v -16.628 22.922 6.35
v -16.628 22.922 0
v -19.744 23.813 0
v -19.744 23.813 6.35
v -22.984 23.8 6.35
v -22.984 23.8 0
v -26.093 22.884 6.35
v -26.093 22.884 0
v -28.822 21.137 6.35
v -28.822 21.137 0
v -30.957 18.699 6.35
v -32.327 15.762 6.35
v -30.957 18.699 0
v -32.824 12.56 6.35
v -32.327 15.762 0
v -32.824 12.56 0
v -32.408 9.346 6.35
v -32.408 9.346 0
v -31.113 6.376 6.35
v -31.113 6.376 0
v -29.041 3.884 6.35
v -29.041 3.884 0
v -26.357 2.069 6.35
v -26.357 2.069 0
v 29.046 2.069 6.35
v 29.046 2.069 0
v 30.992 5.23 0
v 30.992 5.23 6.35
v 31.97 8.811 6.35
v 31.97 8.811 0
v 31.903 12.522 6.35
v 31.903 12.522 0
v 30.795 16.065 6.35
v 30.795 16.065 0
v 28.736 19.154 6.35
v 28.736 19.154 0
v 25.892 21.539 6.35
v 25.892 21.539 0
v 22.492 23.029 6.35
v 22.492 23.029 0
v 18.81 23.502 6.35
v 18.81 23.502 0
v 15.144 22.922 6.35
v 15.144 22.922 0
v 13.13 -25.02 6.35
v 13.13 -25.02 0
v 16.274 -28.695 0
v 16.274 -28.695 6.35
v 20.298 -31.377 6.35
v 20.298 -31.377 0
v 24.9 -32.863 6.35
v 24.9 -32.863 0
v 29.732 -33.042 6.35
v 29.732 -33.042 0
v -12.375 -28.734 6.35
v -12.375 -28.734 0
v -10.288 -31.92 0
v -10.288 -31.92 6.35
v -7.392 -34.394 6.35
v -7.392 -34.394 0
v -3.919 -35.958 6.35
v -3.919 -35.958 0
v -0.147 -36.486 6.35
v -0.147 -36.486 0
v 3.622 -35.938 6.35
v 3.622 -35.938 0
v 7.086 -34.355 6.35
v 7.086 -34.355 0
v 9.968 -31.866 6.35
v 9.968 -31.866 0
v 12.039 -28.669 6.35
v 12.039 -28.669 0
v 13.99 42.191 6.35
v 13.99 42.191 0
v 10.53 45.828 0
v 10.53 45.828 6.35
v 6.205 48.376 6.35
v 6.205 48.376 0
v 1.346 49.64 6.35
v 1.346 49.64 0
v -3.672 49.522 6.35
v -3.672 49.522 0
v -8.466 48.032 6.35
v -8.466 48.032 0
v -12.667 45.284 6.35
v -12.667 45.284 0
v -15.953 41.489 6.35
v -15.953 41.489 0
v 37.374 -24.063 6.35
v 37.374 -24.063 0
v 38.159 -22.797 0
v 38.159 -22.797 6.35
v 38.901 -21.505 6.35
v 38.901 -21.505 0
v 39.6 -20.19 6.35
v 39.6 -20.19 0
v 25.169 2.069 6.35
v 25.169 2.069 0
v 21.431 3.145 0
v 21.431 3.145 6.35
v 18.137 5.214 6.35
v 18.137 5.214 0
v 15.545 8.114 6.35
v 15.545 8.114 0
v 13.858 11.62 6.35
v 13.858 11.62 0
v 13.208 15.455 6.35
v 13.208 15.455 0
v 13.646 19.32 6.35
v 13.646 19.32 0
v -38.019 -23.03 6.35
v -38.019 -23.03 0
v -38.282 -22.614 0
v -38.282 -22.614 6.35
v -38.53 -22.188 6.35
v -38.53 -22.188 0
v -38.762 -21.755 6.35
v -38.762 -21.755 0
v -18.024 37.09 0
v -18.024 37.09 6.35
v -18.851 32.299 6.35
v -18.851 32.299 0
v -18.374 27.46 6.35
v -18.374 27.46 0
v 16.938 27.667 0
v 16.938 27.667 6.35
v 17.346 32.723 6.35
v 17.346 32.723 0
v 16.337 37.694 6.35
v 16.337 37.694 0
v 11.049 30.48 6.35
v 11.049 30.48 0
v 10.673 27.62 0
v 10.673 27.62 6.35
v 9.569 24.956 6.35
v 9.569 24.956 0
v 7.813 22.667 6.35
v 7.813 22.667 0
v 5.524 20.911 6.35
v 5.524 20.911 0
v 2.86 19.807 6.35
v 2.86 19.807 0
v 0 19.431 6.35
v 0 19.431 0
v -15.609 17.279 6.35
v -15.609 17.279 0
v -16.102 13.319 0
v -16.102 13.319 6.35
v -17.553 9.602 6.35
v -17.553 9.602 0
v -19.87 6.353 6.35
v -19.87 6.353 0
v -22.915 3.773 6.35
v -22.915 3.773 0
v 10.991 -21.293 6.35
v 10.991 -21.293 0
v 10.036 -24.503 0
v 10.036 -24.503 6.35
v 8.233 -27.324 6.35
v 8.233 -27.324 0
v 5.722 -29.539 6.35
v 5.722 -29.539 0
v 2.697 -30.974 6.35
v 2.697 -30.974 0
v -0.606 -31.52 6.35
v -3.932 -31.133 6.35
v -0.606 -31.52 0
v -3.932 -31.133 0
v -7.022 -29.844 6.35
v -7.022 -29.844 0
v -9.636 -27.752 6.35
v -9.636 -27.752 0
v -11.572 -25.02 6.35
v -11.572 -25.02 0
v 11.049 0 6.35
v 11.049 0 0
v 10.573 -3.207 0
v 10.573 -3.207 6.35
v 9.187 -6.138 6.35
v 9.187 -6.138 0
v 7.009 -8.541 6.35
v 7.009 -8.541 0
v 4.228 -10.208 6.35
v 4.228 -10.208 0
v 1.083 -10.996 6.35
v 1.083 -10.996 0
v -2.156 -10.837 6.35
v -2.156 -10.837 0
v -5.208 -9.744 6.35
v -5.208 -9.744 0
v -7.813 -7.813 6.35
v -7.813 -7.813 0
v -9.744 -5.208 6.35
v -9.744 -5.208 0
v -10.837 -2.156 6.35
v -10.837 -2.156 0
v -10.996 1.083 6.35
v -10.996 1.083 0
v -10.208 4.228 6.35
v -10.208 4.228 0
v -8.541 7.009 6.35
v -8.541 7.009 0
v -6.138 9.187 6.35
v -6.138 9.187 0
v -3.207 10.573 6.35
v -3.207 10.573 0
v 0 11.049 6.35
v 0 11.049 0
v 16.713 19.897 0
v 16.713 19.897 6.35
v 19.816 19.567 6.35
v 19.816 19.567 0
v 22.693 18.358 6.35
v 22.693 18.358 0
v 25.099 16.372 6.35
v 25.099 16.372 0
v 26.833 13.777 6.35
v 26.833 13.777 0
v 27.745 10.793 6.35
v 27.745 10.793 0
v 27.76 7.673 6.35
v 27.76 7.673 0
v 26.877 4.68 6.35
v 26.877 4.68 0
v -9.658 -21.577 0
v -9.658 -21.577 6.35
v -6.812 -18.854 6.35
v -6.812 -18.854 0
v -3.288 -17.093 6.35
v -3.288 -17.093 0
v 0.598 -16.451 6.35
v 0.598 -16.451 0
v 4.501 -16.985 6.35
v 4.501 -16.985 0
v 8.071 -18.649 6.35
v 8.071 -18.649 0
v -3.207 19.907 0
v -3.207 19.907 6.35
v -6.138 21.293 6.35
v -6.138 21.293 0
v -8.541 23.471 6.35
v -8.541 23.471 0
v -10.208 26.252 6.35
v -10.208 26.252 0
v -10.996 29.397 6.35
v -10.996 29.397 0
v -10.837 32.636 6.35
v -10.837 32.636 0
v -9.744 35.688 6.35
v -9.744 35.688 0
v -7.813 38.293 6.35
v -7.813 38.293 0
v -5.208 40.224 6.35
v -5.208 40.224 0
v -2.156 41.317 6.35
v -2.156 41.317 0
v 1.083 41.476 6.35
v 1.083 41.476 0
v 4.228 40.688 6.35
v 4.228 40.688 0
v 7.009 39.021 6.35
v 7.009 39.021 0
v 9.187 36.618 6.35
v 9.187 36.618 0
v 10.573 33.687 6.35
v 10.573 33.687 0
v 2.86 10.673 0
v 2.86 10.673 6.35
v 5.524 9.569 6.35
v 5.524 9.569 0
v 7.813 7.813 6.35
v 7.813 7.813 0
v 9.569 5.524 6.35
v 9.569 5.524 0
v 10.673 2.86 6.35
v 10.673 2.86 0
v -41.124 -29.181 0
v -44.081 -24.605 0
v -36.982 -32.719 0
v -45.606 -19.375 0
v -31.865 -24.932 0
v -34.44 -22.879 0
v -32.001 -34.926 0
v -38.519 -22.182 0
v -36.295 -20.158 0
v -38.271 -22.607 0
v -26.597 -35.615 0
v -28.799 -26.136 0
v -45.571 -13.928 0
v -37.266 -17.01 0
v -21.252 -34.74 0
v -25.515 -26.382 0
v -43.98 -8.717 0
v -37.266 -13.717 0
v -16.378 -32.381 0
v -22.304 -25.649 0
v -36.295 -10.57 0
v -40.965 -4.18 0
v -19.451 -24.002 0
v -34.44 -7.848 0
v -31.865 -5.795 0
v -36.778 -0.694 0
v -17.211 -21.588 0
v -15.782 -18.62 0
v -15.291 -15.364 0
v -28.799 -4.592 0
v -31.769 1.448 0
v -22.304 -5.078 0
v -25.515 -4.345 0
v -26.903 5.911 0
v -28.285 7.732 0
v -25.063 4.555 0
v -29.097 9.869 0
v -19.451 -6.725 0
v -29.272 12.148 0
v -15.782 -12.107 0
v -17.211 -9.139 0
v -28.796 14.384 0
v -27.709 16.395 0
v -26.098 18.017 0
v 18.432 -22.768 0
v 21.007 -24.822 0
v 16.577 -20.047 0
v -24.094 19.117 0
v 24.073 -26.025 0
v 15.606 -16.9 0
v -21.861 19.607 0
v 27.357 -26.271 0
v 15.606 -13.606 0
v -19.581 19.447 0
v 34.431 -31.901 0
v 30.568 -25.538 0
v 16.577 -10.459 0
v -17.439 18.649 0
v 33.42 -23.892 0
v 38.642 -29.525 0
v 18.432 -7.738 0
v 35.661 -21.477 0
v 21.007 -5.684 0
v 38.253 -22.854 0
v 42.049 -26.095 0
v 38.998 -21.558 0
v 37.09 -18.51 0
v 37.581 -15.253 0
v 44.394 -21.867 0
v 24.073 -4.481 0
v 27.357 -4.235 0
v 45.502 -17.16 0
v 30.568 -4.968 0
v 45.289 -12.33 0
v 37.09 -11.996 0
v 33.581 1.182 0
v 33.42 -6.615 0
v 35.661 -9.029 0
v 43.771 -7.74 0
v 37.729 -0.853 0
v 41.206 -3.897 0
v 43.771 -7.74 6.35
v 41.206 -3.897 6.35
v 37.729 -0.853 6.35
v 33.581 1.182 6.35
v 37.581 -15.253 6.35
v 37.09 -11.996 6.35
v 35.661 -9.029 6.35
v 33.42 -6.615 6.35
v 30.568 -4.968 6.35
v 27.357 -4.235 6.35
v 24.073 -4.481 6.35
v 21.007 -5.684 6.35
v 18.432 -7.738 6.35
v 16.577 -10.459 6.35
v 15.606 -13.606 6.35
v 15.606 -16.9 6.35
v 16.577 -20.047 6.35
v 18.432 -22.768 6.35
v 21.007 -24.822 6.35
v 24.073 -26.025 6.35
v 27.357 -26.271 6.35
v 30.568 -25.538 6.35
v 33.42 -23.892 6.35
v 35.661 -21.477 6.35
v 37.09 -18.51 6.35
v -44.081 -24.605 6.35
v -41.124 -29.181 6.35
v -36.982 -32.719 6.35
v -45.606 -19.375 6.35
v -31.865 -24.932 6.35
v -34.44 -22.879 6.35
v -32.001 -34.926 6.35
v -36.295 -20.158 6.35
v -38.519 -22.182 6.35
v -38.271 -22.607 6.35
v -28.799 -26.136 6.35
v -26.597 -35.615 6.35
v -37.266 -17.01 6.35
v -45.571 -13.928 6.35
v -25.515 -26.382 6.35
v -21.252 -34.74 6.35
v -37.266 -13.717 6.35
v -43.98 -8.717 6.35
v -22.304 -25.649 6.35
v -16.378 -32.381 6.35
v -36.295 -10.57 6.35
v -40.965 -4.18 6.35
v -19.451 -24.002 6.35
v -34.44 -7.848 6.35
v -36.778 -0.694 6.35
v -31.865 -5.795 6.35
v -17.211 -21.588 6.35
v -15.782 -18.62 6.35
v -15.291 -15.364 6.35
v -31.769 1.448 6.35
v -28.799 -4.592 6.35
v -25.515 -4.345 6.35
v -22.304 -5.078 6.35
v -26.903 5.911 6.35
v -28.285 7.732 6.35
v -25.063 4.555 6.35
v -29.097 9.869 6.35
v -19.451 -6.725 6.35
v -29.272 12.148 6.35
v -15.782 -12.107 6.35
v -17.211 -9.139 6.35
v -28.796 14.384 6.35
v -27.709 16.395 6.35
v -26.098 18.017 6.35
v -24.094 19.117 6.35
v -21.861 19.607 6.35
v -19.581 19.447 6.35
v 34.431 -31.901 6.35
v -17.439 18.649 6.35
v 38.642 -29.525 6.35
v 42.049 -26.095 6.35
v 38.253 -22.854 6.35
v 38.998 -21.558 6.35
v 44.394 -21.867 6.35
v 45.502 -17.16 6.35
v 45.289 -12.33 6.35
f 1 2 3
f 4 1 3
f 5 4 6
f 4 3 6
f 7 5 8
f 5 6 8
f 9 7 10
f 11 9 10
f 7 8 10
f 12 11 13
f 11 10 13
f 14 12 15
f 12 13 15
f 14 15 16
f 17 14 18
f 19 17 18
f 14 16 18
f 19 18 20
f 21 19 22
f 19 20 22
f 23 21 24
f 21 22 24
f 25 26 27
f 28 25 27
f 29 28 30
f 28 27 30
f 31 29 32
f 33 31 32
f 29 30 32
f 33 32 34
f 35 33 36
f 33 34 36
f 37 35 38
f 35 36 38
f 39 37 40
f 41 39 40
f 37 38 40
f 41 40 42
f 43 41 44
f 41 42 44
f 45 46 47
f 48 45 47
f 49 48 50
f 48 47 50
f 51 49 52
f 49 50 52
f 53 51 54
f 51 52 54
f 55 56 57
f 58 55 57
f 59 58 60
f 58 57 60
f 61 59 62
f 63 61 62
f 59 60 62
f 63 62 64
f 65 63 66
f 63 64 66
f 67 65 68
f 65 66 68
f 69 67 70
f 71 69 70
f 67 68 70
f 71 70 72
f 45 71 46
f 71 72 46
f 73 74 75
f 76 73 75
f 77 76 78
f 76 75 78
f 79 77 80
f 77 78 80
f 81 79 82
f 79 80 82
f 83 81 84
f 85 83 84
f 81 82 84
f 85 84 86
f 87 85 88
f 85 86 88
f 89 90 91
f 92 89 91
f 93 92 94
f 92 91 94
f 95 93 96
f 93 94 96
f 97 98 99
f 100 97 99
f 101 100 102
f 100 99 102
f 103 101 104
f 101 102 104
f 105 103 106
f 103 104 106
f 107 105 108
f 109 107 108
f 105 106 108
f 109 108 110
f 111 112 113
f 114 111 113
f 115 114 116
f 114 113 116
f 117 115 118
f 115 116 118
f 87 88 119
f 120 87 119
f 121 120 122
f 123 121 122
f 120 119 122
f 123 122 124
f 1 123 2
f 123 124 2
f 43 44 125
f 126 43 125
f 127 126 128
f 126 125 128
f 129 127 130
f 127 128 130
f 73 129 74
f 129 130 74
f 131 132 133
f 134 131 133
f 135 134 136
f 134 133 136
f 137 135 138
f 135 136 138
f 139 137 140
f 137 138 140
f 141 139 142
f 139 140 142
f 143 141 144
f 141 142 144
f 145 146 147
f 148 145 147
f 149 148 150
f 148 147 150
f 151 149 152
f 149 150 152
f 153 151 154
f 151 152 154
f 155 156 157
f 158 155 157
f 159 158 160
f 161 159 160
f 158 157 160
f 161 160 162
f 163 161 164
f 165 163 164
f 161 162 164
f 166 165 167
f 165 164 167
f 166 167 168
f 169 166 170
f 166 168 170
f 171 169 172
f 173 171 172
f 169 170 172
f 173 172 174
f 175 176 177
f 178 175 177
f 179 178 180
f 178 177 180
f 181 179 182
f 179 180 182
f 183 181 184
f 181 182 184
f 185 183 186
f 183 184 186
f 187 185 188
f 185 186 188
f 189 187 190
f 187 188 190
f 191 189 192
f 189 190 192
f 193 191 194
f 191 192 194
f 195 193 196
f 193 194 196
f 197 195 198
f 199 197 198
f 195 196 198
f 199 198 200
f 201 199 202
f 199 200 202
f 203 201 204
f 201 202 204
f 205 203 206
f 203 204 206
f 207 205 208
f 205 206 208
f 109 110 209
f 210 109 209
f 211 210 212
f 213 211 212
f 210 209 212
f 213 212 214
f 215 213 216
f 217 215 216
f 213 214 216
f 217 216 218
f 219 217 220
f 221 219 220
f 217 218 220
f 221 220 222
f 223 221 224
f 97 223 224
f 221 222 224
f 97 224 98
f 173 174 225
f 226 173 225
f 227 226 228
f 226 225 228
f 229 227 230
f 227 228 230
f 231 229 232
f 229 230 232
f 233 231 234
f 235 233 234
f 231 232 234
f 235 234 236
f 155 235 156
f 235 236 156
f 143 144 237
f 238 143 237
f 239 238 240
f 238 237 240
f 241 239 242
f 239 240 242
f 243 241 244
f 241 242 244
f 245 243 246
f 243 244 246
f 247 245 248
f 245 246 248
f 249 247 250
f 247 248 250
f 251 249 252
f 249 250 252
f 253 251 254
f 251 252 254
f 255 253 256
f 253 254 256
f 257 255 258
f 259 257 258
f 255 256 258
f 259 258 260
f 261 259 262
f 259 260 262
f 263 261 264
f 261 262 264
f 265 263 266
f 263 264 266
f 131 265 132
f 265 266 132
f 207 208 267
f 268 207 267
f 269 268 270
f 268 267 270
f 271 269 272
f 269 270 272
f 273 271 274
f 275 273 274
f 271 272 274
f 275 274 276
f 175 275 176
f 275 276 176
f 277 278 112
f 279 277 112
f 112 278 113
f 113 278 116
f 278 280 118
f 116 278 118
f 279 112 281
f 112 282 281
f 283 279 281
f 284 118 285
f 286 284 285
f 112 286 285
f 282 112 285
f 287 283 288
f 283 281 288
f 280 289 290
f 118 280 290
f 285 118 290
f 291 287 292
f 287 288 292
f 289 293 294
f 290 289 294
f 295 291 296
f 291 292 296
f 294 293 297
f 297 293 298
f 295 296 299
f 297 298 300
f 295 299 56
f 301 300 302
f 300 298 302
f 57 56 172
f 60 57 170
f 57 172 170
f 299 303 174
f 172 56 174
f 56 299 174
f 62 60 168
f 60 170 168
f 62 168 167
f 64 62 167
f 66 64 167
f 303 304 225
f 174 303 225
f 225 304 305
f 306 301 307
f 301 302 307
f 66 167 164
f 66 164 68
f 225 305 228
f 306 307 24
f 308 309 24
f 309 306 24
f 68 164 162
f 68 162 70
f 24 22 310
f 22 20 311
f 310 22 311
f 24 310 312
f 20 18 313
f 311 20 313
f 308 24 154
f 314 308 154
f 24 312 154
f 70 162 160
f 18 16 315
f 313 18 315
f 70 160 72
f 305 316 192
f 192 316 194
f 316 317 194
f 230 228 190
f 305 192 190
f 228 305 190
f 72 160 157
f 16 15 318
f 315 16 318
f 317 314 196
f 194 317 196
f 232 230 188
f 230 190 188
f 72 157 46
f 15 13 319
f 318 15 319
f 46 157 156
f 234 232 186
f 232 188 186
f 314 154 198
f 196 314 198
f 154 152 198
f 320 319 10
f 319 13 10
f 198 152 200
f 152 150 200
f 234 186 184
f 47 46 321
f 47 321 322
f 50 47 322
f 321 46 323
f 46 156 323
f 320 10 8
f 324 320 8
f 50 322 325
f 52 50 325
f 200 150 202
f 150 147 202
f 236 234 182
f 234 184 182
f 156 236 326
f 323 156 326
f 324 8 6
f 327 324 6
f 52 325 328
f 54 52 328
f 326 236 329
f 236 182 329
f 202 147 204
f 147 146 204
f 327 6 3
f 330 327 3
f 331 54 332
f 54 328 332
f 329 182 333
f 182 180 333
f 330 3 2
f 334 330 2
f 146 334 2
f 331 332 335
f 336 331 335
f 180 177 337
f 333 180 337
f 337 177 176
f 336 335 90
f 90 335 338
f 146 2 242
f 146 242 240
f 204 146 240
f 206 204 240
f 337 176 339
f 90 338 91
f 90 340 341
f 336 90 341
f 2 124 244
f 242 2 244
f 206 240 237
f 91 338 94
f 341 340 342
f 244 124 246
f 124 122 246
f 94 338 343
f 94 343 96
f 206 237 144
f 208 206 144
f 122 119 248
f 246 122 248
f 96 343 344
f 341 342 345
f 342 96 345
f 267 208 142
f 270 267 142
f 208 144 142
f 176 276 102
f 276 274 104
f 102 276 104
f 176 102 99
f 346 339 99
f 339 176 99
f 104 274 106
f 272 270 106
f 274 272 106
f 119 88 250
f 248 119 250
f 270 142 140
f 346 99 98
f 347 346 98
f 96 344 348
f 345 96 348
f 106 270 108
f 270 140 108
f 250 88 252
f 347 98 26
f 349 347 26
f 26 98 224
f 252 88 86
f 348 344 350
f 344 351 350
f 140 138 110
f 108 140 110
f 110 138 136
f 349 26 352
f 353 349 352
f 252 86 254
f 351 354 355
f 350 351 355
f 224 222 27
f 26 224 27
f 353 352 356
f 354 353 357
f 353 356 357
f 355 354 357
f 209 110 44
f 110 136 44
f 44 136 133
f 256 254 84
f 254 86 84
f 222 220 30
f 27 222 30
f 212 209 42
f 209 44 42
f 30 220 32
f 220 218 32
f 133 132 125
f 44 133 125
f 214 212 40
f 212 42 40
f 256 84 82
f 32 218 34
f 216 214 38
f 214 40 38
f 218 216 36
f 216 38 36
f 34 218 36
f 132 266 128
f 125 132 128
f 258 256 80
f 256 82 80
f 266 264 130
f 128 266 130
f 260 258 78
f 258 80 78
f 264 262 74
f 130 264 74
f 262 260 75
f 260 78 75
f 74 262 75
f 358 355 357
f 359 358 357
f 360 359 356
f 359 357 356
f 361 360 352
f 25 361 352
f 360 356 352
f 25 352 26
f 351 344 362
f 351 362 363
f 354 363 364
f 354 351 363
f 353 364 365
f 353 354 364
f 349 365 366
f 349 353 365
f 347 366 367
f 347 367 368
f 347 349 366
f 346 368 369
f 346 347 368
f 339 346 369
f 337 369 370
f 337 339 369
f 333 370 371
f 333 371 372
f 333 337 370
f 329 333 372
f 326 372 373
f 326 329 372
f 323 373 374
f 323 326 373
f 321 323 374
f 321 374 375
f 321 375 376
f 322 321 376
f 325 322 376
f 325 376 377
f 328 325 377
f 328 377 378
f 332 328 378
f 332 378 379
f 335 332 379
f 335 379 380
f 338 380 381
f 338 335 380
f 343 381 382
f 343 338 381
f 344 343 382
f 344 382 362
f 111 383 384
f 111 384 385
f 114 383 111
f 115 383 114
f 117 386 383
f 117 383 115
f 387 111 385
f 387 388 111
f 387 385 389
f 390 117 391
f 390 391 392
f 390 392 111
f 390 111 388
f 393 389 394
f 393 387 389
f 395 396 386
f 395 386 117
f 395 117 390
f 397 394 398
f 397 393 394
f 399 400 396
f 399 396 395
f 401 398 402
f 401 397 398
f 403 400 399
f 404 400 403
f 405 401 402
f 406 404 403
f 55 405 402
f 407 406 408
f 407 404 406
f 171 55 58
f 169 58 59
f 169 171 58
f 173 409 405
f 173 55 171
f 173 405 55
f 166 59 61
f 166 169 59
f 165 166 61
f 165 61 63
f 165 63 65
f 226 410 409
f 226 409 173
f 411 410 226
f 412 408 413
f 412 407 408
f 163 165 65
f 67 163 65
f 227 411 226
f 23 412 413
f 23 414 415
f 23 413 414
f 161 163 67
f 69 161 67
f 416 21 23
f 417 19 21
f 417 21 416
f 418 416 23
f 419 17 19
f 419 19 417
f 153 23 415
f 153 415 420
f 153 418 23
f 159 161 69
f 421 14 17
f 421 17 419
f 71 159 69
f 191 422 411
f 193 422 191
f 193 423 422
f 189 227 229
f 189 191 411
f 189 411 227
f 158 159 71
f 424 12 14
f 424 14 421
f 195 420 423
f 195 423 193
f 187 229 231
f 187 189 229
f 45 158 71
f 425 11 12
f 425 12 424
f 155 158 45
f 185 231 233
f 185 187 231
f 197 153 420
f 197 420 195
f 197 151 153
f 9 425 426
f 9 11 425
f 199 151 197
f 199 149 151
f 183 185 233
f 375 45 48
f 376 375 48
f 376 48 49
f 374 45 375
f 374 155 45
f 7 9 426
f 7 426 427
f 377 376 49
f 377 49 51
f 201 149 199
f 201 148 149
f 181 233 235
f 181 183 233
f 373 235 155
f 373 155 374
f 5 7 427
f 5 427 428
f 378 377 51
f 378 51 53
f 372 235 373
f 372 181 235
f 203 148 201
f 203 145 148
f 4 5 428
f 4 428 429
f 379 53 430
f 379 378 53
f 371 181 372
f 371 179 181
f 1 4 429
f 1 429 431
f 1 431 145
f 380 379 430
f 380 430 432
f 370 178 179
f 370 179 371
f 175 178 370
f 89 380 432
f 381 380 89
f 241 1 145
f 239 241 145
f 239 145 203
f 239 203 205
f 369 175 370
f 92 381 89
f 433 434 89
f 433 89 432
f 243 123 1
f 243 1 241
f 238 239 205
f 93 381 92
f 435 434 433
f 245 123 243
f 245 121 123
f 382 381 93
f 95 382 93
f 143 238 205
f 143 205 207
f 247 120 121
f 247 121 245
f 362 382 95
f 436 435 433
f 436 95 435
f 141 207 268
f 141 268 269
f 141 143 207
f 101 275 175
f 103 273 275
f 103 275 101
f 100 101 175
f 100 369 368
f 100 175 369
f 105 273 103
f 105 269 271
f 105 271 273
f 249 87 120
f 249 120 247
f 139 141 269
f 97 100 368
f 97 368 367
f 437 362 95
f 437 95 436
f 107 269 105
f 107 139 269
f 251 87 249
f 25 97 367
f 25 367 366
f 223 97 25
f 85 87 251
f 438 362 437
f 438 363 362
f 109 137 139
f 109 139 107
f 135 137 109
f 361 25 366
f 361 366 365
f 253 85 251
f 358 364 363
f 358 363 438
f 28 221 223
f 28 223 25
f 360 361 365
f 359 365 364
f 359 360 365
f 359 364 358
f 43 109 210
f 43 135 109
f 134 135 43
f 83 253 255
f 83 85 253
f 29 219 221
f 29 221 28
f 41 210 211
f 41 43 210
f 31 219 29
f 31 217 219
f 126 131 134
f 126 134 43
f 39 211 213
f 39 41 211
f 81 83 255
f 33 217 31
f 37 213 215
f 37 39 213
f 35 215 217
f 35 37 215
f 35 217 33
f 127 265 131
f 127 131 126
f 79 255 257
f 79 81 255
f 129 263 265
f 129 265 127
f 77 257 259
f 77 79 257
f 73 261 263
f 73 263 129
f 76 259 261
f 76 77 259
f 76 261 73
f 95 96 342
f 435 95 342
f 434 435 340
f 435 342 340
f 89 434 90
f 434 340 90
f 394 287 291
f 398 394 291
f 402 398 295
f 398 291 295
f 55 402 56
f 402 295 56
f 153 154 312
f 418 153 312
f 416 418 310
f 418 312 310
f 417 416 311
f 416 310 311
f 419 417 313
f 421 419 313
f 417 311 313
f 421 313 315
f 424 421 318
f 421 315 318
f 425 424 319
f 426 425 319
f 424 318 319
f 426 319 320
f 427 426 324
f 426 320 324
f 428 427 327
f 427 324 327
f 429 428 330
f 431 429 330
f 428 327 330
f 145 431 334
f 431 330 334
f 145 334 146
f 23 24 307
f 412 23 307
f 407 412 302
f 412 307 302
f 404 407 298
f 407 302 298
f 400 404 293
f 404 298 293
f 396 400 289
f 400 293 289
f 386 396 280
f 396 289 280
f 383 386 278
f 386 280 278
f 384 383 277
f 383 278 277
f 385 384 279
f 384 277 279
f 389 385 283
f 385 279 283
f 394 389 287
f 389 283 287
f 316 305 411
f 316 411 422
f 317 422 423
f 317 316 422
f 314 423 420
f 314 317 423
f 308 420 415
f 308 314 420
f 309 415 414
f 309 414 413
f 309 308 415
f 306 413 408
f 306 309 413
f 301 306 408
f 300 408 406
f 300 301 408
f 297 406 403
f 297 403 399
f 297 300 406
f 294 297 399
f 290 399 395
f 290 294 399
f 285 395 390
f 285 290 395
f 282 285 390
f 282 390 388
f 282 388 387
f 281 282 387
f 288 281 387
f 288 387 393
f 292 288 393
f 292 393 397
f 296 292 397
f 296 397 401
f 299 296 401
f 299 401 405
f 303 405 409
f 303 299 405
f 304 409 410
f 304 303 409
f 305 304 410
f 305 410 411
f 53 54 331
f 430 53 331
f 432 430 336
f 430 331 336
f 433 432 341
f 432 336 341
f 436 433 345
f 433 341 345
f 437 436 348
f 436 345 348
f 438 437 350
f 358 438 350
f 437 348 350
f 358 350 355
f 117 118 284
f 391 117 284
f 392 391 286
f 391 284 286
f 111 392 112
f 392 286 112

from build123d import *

# Parameters (mm, degrees)
F0_R     = 11.049
F1_DEPTH = 6.35


with BuildPart() as f1:
    # F0 (on Top) → F1 (new body)
    with BuildSketch(Plane.XY):
        with BuildLine():
            ThreePointArc((13.9900267073, 42.191013886), (7.0856169162, 43.8816195339), (1.001e-07, 44.45))
            ThreePointArc((1.001e-07, 44.45), (-8.1127014874, 43.7033931701), (-15.9528722093, 41.4886534883))
            ThreePointArc((-15.9528722093, 41.4886534883), (-18.8508822531, 32.2986856143), (-16.6280791163, 22.9224860668))
            ThreePointArc((-16.6280791163, 22.9224860668), (-15.8658789133, 20.1464210948), (-15.6090878752, 17.2790975622))
            ThreePointArc((-15.6090878752, 17.2790975622), (-17.5525161747, 9.6016065701), (-22.9146844129, 3.773405023))
            ThreePointArc((-22.9146844129, 3.773405023), (-24.5849396697, 2.8183178083), (-26.356998831, 2.0688176155))
            ThreePointArc((-26.356998831, 2.0688176155), (-36.5044925545, -0.529991355), (-43.6973944973, -8.1449502237))
            ThreePointArc((-43.6973944973, -8.1449502237), (-41.7877364398, -15.1521478094), (-38.7624793768, -21.7548314763))
            ThreePointArc((-38.7624793768, -21.7548314763), (-29.6282610574, -1.7859753114), (-12.3702381212, -15.3635231449))
            ThreePointArc((-12.3702381212, -15.3635231449), (-22.3396426217, -28.7484450965), (-38.018933275, -23.0296159897))
            ThreePointArc((-38.018933275, -23.0296159897), (-32.9149121168, -29.8732499126), (-26.5966764592, -35.6148747201))
            ThreePointArc((-26.5966764592, -35.6148747201), (-18.7298982199, -33.736427955), (-12.3747177422, -28.7337843329))
            ThreePointArc((-12.3747177422, -28.7337843329), (-12.1077253896, -26.8478523844), (-11.5717802867, -25.020070374))
            ThreePointArc((-11.5717802867, -25.020070374), (-1.3693127664, -16.6255914205), (10.9906537522, -21.2934440388))
            ThreePointArc((10.9906537522, -21.2934440388), (12.2133658929, -23.0689970739), (13.13038636, -25.020070374))
            ThreePointArc((13.13038636, -25.020070374), (20.2980282513, -31.3766165327), (29.7323518206, -33.0422419823))
            ThreePointArc((29.7323518206, -33.0422419823), (33.8520296012, -28.8069885944), (37.3735987968, -24.0627640345))
            ThreePointArc((37.3735987968, -24.0627640345), (13.3667253576, -10.5788234649), (40.5015365819, -15.2530769271))
            ThreePointArc((40.5015365819, -15.2530769271), (40.2743565397, -17.7622201291), (39.6002052135, -20.1897559927))
            ThreePointArc((39.6002052135, -20.1897559927), (42.1478196292, -14.1196246586), (43.7709726947, -7.7397964674))
            ThreePointArc((43.7709726947, -7.7397964674), (37.7292227786, -0.852924429), (29.046183452, 2.0688176155))
            ThreePointArc((29.046183452, 2.0688176155), (27.1074059125, 1.9329851963), (25.168628373, 2.0688176155))
            ThreePointArc((25.168628373, 2.0688176155), (15.5450488675, 8.1144987903), (13.6462865444, 19.3197763418))
            ThreePointArc((13.6462865444, 19.3197763418), (14.2680191104, 21.1739149673), (15.1437362656, 22.9224860668))
            ThreePointArc((15.1437362656, 22.9224860668), (17.3461160042, 32.7231575742), (13.9900267073, 42.191013886))
        make_face()
        with BuildLine():
            ThreePointArc((14.0337661536, -0.0455333574), (-9.7919450545, -9.9463341625), (0, 13.9243211114))
            ThreePointArc((0, 13.9243211114), (9.9194773617, 9.8552674478), (14.0337661536, -0.0455333574))
        make_face(mode=Mode.SUBTRACT)
        with BuildLine():
            ThreePointArc((13.97, 30.48), (9.8782817332, 20.6017182668), (0, 16.51))
            ThreePointArc((0, 16.51), (-13.97, 30.4800000501), (1.001e-07, 44.45))
            ThreePointArc((1.001e-07, 44.45), (9.8782817686, 40.3582816978), (13.97, 30.48))
        make_face(mode=Mode.SUBTRACT)
        with BuildLine():
            ThreePointArc((14.0337661536, -0.0455333574), (9.9194773617, 9.8552674478), (0, 13.9243211114))
            ThreePointArc((0, 13.9243211114), (-9.7919450545, -9.9463341625), (14.0337661536, -0.0455333574))
        make_face()
        with BuildLine():
            ThreePointArc((0, 11.049), (7.8128228253, 7.8128228253), (11.049, 0))
            ThreePointArc((11.049, 0), (-7.8128228253, -7.8128228253), (0, 11.049))
        make_face(mode=Mode.SUBTRACT)
        with BuildLine():
            ThreePointArc((1.001e-07, 44.45), (-13.97, 30.4800000501), (0, 16.51))
            ThreePointArc((0, 16.51), (9.8782817332, 20.6017182668), (13.97, 30.48))
            ThreePointArc((13.97, 30.48), (9.8782817686, 40.3582816978), (1.001e-07, 44.45))
        make_face()
        with BuildLine():
            ThreePointArc((11.049, 30.48), (7.8128228253, 22.6671771747), (0, 19.431))
            ThreePointArc((0, 19.431), (-7.8128228253, 38.2928228253), (11.049, 30.48))
        make_face(mode=Mode.SUBTRACT)
        with BuildLine():
            ThreePointArc((-12.3702381212, -15.3635231449), (-29.6282610574, -1.7859753114), (-38.7624793768, -21.7548314763))
            ThreePointArc((-38.7624793768, -21.7548314763), (-38.3959972014, -22.3953097524), (-38.018933275, -23.0296159897))
            ThreePointArc((-38.018933275, -23.0296159897), (-22.3396426217, -28.7484450965), (-12.3702381212, -15.3635231449))
        make_face()
        with Locations((-26.3402381212, -15.3635231449)):
            Circle(F0_R, mode=Mode.SUBTRACT)
        with BuildLine():
            ThreePointArc((37.3735987968, -24.0627640345), (38.5355897032, -22.1542507484), (39.6002052135, -20.1897559927))
            ThreePointArc((39.6002052135, -20.1897559927), (40.2743565397, -17.7622201291), (40.5015365819, -15.2530769271))
            ThreePointArc((40.5015365819, -15.2530769271), (13.3667253576, -10.5788234649), (37.3735987968, -24.0627640345))
        make_face()
        with Locations((26.5315365819, -15.2530769271)):
            Circle(F0_R, mode=Mode.SUBTRACT)
        with BuildLine():
            ThreePointArc((-38.7624793768, -21.7548314763), (-41.7877364398, -15.1521478094), (-43.6973944973, -8.1449502237))
            ThreePointArc((-43.6973944973, -8.1449502237), (-42.9395681626, -26.7309598149), (-26.5966764592, -35.6148747201))
            ThreePointArc((-26.5966764592, -35.6148747201), (-32.9149121168, -29.8732499126), (-38.018933275, -23.0296159897))
            ThreePointArc((-38.018933275, -23.0296159897), (-38.4075515273, -22.4020490671), (-38.7624793768, -21.7548314763))
        make_face()
        with BuildLine():
            ThreePointArc((-11.5717802867, -25.020070374), (-12.1077253896, -26.8478523844), (-12.3747177422, -28.7337843329))
            ThreePointArc((-12.3747177422, -28.7337843329), (1.7565735529, -36.3458547771), (13.13038636, -25.020070374))
            ThreePointArc((13.13038636, -25.020070374), (12.2133658929, -23.0689970739), (10.9906537522, -21.2934440388))
            ThreePointArc((10.9906537522, -21.2934440388), (1.0648132035, -31.3627294368), (-11.5717802867, -25.020070374))
        make_face()
        with BuildLine():
            ThreePointArc((29.046183452, 2.0688176155), (29.875596689, 17.6827436404), (15.1437362656, 22.9224860668))
            ThreePointArc((15.1437362656, 22.9224860668), (14.2680191104, 21.1739149673), (13.6462865444, 19.3197763418))
            ThreePointArc((13.6462865444, 19.3197763418), (26.0608319773, 15.138250311), (25.168628373, 2.0688176155))
            ThreePointArc((25.168628373, 2.0688176155), (27.1074059125, 1.9329851963), (29.046183452, 2.0688176155))
        make_face()
        with BuildLine():
            ThreePointArc((-15.6090878752, 17.2790975622), (-15.8658789133, 20.1464210948), (-16.6280791163, 22.9224860668))
            ThreePointArc((-16.6280791163, 22.9224860668), (-31.7457216544, 17.2790975622), (-26.356998831, 2.0688176155))
            ThreePointArc((-26.356998831, 2.0688176155), (-24.5849396697, 2.8183178083), (-22.9146844129, 3.773405023))
            ThreePointArc((-22.9146844129, 3.773405023), (-28.3246437936, 15.4285434715), (-15.6090878752, 17.2790975622))
        make_face()
        with BuildLine():
            ThreePointArc((-15.9528722093, 41.4886534883), (-8.1127014874, 43.7033931701), (1.001e-07, 44.45))
            ThreePointArc((1.001e-07, 44.45), (7.0856169162, 43.8816195339), (13.9900267073, 42.191013886))
            ThreePointArc((13.9900267073, 42.191013886), (-1.1671052189, 49.7558144069), (-15.9528722093, 41.4886534883))
        make_face()
        with BuildLine():
            ThreePointArc((29.7323518206, -33.0422419823), (43.3672029043, -24.0615366442), (43.7709726947, -7.7397964674))
            ThreePointArc((43.7709726947, -7.7397964674), (42.1478196292, -14.1196246586), (39.6002052135, -20.1897559927))
            ThreePointArc((39.6002052135, -20.1897559927), (38.6427219172, -22.2158414481), (37.3735987968, -24.0627640345))
            ThreePointArc((37.3735987968, -24.0627640345), (33.8520296012, -28.8069885944), (29.7323518206, -33.0422419823))
        make_face()
    extrude(amount=F1_DEPTH)


solid = f1.part
